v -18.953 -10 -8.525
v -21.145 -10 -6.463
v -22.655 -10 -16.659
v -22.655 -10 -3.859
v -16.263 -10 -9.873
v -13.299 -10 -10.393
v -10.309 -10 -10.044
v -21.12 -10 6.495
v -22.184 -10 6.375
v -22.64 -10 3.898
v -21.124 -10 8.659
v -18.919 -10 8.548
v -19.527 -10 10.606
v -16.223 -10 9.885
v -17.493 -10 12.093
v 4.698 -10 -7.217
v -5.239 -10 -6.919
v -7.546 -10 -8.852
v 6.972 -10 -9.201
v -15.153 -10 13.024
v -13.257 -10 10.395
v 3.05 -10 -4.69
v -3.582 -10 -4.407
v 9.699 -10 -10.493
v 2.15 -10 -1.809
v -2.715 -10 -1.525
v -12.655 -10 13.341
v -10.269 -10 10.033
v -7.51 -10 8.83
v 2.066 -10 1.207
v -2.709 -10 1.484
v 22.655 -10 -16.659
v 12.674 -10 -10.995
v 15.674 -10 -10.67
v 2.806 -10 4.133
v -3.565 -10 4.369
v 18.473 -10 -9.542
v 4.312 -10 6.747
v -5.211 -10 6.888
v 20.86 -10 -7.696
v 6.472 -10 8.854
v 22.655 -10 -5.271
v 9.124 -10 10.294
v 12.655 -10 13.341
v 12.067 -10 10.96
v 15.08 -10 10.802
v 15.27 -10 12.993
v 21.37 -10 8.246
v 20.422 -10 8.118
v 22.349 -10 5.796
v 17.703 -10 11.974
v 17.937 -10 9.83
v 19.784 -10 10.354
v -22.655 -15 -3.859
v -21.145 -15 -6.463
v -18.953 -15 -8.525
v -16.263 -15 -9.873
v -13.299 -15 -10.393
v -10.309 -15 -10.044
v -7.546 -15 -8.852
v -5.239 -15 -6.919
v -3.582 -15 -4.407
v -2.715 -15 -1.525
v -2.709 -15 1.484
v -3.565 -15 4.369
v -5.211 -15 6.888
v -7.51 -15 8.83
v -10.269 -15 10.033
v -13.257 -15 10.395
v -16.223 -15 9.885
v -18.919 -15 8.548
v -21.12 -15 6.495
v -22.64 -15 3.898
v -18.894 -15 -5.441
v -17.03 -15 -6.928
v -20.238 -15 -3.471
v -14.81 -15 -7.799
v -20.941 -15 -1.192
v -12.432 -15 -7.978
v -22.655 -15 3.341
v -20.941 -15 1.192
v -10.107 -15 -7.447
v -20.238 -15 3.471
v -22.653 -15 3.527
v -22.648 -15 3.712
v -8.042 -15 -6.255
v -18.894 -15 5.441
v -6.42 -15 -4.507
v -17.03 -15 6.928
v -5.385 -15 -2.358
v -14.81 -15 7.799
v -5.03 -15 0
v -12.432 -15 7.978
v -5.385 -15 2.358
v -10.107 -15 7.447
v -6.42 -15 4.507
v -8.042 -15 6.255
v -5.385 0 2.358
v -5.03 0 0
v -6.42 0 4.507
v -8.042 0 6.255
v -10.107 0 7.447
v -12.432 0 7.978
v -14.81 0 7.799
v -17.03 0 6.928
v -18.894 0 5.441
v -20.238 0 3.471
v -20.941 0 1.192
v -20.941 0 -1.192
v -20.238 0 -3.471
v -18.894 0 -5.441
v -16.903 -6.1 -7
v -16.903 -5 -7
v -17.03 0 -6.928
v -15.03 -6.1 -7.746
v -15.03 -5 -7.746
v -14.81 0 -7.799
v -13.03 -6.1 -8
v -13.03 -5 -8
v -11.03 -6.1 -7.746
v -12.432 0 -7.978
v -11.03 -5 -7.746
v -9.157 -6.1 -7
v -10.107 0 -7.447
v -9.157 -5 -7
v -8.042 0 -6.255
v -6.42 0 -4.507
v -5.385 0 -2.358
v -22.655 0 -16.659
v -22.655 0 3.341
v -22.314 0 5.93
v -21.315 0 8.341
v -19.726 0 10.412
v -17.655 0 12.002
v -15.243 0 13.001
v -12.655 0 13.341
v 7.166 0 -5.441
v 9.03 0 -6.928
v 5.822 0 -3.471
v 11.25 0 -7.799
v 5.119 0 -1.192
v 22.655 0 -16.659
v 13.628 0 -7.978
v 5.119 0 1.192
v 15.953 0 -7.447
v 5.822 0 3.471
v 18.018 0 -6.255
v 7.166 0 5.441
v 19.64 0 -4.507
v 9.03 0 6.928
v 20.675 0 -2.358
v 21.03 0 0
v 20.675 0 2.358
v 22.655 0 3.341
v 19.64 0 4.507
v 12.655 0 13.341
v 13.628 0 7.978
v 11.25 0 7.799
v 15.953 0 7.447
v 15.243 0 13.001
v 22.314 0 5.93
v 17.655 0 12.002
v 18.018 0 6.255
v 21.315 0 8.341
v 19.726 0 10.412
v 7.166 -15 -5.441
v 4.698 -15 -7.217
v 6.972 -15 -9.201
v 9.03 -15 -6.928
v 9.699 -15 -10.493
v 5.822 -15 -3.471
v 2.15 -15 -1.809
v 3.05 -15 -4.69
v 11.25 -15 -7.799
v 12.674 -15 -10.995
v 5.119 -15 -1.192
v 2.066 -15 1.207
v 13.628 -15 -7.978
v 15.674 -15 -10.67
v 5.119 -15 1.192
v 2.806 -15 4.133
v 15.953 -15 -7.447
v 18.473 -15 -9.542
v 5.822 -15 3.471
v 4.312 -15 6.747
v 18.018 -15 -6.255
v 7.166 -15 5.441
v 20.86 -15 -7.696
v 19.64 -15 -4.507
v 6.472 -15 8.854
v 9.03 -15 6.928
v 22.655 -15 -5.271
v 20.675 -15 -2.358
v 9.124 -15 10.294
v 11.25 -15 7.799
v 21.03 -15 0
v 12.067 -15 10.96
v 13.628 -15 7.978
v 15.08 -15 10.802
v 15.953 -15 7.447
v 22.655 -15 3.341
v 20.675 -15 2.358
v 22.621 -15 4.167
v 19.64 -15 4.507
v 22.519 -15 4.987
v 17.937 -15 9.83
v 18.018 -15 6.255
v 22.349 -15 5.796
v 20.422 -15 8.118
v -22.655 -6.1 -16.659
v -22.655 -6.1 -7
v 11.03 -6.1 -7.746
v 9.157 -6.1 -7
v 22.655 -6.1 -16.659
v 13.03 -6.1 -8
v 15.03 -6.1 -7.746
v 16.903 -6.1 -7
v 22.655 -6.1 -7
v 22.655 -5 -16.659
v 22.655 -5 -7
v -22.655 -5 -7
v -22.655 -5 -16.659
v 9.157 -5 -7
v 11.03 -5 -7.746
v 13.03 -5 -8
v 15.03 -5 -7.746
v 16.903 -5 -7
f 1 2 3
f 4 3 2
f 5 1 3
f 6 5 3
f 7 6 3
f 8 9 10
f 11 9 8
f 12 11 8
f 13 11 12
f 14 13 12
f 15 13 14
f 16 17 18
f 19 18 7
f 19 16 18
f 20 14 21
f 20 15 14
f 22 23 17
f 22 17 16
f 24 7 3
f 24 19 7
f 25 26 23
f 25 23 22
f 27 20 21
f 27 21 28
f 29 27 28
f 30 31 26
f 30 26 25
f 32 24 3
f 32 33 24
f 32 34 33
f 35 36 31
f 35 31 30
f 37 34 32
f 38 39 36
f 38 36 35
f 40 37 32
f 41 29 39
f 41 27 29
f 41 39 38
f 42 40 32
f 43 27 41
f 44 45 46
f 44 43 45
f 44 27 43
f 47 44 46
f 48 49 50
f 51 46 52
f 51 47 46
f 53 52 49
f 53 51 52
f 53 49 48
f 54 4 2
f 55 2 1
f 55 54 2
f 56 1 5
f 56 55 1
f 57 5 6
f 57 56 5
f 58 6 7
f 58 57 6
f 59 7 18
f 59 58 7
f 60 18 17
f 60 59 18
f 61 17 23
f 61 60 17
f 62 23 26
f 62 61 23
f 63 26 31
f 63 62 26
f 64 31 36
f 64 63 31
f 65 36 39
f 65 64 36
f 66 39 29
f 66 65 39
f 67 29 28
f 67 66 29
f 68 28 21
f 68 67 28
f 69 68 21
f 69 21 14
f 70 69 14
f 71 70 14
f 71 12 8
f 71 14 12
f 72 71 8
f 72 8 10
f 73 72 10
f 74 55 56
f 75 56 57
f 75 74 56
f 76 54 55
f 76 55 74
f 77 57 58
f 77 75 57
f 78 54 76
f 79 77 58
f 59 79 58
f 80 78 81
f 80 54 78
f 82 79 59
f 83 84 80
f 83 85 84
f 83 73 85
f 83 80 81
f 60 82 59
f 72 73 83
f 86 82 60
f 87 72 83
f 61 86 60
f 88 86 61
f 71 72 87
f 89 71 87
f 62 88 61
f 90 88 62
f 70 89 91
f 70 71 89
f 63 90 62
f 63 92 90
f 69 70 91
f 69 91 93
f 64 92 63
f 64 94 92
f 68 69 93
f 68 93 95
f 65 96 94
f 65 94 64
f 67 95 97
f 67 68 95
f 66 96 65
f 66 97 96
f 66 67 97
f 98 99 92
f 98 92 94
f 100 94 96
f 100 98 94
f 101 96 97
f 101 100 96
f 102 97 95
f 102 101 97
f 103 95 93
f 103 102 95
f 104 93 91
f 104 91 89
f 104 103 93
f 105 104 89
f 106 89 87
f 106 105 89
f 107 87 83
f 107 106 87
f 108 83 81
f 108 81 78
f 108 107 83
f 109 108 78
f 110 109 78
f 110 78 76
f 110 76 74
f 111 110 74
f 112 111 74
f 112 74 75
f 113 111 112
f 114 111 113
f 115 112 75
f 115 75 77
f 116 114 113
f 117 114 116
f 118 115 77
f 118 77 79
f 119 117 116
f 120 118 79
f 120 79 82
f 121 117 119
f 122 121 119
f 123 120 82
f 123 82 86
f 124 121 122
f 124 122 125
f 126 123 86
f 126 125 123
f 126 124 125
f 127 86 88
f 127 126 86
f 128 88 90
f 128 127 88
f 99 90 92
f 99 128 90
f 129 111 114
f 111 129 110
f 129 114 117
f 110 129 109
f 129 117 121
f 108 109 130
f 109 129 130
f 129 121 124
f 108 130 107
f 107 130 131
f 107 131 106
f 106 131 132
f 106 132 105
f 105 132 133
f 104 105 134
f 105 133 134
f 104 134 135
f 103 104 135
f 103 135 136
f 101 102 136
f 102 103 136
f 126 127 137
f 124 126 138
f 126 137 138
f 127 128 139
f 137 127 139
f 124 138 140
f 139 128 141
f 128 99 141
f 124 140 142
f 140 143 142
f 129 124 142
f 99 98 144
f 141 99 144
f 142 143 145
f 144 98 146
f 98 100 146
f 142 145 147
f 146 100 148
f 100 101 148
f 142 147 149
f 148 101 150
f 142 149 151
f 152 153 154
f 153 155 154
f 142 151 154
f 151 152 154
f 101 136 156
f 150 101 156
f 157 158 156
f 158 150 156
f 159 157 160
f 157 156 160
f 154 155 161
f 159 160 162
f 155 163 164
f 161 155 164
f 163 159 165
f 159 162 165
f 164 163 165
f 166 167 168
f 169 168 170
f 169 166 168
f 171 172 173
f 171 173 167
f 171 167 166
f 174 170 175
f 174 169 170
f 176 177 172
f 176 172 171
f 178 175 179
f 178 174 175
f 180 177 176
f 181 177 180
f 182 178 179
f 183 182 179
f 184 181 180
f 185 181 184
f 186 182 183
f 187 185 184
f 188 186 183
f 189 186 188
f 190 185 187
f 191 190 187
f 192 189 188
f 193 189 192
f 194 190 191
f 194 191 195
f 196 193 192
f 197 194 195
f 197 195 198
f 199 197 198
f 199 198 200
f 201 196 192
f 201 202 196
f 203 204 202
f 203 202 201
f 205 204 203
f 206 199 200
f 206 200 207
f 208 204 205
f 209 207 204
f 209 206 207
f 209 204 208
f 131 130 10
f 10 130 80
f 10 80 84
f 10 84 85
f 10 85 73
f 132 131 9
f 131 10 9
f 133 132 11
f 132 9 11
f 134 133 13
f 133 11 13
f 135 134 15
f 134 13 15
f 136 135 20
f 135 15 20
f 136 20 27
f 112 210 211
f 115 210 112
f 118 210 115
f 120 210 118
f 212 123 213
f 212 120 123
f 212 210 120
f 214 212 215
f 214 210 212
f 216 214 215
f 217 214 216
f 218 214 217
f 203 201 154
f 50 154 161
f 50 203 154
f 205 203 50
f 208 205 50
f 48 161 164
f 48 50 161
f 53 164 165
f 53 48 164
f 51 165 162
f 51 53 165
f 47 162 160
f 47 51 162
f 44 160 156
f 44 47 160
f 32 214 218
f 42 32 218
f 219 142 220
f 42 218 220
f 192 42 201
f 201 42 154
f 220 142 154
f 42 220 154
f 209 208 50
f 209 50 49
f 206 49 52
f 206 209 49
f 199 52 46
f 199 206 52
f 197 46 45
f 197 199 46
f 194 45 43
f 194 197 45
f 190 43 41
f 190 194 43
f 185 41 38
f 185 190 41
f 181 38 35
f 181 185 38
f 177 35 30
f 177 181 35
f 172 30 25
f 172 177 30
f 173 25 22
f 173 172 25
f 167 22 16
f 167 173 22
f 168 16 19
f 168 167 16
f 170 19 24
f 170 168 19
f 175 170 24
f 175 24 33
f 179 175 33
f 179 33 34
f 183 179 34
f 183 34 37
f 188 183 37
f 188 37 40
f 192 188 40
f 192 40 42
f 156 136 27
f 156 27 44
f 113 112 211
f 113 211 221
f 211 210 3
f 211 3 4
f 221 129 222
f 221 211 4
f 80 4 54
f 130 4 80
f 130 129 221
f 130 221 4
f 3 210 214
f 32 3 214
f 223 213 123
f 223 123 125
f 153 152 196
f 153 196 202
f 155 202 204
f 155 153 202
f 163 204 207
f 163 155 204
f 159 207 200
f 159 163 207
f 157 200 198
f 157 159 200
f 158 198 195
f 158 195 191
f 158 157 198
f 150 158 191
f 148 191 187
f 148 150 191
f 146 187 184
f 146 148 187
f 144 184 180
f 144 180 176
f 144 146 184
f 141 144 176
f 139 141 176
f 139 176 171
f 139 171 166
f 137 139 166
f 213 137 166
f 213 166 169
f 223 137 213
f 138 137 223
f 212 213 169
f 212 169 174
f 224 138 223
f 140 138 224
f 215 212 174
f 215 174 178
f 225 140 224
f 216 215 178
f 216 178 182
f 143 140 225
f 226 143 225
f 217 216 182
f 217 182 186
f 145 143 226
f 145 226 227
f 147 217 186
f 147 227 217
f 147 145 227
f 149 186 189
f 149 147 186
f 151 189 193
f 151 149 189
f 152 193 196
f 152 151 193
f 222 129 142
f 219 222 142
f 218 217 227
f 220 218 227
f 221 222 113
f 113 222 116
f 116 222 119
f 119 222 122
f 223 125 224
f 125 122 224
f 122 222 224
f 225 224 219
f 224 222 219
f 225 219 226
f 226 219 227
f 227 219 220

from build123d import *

# Parameters (mm, degrees)
F0_W          = 45.31
F0_H          = 30
F0_R          = 8
F1_DEPTH      = 15
F2_W          = 1.1
F2_H          = 12
F3_DEPTH      = 25
F3_DEPTH_BACK = 25
F5_W          = 59.0507443994
F5_H          = 44.4323215634
F5_R          = 10.3976804266
F5_R_2        = 11
F6_DEPTH      = 5
F7_R          = 10


with BuildPart() as f1:
    # F0 (on Front) → F1 (new body)
    with BuildSketch(Plane.XZ):
        with Locations((0, -1.6586469859)):
            Rectangle(F0_W, F0_H)
        with Locations((-13.03, 0)):
            Circle(F0_R, mode=Mode.SUBTRACT)
        with Locations((13.03, 0)):
            Circle(F0_R, mode=Mode.SUBTRACT)
    extrude(amount=F1_DEPTH)

    # F2 (on Right) → F3 (cut, two sides)
    with BuildSketch(Plane.YZ) as f3_sk:
        with Locations((-5.55, -13)):
            Rectangle(F2_W, F2_H)
    extrude(amount=-F3_DEPTH, mode=Mode.SUBTRACT)
    extrude(f3_sk.sketch, amount=F3_DEPTH_BACK, mode=Mode.SUBTRACT)

    # F5 (on offset) → F6 (cut)
    with BuildSketch(Plane.XZ.offset(15)):
        with Locations((2.6295455173, 0.7389681414)):
            Rectangle(F5_W, F5_H)
        with Locations((-13, 0)):
            Circle(F5_R, mode=Mode.SUBTRACT)
        with Locations((13, 0)):
            Circle(F5_R_2, mode=Mode.SUBTRACT)
    extrude(amount=-F6_DEPTH, mode=Mode.SUBTRACT)

    # F7
    f7_edges = [f1.edges().sort_by_distance(p)[0] for p in [
        (22.655, -5, 13.341353),
        (-22.655, -5, 13.341353),
    ]]
    fillet(f7_edges, radius=F7_R)


solid = f1.part
